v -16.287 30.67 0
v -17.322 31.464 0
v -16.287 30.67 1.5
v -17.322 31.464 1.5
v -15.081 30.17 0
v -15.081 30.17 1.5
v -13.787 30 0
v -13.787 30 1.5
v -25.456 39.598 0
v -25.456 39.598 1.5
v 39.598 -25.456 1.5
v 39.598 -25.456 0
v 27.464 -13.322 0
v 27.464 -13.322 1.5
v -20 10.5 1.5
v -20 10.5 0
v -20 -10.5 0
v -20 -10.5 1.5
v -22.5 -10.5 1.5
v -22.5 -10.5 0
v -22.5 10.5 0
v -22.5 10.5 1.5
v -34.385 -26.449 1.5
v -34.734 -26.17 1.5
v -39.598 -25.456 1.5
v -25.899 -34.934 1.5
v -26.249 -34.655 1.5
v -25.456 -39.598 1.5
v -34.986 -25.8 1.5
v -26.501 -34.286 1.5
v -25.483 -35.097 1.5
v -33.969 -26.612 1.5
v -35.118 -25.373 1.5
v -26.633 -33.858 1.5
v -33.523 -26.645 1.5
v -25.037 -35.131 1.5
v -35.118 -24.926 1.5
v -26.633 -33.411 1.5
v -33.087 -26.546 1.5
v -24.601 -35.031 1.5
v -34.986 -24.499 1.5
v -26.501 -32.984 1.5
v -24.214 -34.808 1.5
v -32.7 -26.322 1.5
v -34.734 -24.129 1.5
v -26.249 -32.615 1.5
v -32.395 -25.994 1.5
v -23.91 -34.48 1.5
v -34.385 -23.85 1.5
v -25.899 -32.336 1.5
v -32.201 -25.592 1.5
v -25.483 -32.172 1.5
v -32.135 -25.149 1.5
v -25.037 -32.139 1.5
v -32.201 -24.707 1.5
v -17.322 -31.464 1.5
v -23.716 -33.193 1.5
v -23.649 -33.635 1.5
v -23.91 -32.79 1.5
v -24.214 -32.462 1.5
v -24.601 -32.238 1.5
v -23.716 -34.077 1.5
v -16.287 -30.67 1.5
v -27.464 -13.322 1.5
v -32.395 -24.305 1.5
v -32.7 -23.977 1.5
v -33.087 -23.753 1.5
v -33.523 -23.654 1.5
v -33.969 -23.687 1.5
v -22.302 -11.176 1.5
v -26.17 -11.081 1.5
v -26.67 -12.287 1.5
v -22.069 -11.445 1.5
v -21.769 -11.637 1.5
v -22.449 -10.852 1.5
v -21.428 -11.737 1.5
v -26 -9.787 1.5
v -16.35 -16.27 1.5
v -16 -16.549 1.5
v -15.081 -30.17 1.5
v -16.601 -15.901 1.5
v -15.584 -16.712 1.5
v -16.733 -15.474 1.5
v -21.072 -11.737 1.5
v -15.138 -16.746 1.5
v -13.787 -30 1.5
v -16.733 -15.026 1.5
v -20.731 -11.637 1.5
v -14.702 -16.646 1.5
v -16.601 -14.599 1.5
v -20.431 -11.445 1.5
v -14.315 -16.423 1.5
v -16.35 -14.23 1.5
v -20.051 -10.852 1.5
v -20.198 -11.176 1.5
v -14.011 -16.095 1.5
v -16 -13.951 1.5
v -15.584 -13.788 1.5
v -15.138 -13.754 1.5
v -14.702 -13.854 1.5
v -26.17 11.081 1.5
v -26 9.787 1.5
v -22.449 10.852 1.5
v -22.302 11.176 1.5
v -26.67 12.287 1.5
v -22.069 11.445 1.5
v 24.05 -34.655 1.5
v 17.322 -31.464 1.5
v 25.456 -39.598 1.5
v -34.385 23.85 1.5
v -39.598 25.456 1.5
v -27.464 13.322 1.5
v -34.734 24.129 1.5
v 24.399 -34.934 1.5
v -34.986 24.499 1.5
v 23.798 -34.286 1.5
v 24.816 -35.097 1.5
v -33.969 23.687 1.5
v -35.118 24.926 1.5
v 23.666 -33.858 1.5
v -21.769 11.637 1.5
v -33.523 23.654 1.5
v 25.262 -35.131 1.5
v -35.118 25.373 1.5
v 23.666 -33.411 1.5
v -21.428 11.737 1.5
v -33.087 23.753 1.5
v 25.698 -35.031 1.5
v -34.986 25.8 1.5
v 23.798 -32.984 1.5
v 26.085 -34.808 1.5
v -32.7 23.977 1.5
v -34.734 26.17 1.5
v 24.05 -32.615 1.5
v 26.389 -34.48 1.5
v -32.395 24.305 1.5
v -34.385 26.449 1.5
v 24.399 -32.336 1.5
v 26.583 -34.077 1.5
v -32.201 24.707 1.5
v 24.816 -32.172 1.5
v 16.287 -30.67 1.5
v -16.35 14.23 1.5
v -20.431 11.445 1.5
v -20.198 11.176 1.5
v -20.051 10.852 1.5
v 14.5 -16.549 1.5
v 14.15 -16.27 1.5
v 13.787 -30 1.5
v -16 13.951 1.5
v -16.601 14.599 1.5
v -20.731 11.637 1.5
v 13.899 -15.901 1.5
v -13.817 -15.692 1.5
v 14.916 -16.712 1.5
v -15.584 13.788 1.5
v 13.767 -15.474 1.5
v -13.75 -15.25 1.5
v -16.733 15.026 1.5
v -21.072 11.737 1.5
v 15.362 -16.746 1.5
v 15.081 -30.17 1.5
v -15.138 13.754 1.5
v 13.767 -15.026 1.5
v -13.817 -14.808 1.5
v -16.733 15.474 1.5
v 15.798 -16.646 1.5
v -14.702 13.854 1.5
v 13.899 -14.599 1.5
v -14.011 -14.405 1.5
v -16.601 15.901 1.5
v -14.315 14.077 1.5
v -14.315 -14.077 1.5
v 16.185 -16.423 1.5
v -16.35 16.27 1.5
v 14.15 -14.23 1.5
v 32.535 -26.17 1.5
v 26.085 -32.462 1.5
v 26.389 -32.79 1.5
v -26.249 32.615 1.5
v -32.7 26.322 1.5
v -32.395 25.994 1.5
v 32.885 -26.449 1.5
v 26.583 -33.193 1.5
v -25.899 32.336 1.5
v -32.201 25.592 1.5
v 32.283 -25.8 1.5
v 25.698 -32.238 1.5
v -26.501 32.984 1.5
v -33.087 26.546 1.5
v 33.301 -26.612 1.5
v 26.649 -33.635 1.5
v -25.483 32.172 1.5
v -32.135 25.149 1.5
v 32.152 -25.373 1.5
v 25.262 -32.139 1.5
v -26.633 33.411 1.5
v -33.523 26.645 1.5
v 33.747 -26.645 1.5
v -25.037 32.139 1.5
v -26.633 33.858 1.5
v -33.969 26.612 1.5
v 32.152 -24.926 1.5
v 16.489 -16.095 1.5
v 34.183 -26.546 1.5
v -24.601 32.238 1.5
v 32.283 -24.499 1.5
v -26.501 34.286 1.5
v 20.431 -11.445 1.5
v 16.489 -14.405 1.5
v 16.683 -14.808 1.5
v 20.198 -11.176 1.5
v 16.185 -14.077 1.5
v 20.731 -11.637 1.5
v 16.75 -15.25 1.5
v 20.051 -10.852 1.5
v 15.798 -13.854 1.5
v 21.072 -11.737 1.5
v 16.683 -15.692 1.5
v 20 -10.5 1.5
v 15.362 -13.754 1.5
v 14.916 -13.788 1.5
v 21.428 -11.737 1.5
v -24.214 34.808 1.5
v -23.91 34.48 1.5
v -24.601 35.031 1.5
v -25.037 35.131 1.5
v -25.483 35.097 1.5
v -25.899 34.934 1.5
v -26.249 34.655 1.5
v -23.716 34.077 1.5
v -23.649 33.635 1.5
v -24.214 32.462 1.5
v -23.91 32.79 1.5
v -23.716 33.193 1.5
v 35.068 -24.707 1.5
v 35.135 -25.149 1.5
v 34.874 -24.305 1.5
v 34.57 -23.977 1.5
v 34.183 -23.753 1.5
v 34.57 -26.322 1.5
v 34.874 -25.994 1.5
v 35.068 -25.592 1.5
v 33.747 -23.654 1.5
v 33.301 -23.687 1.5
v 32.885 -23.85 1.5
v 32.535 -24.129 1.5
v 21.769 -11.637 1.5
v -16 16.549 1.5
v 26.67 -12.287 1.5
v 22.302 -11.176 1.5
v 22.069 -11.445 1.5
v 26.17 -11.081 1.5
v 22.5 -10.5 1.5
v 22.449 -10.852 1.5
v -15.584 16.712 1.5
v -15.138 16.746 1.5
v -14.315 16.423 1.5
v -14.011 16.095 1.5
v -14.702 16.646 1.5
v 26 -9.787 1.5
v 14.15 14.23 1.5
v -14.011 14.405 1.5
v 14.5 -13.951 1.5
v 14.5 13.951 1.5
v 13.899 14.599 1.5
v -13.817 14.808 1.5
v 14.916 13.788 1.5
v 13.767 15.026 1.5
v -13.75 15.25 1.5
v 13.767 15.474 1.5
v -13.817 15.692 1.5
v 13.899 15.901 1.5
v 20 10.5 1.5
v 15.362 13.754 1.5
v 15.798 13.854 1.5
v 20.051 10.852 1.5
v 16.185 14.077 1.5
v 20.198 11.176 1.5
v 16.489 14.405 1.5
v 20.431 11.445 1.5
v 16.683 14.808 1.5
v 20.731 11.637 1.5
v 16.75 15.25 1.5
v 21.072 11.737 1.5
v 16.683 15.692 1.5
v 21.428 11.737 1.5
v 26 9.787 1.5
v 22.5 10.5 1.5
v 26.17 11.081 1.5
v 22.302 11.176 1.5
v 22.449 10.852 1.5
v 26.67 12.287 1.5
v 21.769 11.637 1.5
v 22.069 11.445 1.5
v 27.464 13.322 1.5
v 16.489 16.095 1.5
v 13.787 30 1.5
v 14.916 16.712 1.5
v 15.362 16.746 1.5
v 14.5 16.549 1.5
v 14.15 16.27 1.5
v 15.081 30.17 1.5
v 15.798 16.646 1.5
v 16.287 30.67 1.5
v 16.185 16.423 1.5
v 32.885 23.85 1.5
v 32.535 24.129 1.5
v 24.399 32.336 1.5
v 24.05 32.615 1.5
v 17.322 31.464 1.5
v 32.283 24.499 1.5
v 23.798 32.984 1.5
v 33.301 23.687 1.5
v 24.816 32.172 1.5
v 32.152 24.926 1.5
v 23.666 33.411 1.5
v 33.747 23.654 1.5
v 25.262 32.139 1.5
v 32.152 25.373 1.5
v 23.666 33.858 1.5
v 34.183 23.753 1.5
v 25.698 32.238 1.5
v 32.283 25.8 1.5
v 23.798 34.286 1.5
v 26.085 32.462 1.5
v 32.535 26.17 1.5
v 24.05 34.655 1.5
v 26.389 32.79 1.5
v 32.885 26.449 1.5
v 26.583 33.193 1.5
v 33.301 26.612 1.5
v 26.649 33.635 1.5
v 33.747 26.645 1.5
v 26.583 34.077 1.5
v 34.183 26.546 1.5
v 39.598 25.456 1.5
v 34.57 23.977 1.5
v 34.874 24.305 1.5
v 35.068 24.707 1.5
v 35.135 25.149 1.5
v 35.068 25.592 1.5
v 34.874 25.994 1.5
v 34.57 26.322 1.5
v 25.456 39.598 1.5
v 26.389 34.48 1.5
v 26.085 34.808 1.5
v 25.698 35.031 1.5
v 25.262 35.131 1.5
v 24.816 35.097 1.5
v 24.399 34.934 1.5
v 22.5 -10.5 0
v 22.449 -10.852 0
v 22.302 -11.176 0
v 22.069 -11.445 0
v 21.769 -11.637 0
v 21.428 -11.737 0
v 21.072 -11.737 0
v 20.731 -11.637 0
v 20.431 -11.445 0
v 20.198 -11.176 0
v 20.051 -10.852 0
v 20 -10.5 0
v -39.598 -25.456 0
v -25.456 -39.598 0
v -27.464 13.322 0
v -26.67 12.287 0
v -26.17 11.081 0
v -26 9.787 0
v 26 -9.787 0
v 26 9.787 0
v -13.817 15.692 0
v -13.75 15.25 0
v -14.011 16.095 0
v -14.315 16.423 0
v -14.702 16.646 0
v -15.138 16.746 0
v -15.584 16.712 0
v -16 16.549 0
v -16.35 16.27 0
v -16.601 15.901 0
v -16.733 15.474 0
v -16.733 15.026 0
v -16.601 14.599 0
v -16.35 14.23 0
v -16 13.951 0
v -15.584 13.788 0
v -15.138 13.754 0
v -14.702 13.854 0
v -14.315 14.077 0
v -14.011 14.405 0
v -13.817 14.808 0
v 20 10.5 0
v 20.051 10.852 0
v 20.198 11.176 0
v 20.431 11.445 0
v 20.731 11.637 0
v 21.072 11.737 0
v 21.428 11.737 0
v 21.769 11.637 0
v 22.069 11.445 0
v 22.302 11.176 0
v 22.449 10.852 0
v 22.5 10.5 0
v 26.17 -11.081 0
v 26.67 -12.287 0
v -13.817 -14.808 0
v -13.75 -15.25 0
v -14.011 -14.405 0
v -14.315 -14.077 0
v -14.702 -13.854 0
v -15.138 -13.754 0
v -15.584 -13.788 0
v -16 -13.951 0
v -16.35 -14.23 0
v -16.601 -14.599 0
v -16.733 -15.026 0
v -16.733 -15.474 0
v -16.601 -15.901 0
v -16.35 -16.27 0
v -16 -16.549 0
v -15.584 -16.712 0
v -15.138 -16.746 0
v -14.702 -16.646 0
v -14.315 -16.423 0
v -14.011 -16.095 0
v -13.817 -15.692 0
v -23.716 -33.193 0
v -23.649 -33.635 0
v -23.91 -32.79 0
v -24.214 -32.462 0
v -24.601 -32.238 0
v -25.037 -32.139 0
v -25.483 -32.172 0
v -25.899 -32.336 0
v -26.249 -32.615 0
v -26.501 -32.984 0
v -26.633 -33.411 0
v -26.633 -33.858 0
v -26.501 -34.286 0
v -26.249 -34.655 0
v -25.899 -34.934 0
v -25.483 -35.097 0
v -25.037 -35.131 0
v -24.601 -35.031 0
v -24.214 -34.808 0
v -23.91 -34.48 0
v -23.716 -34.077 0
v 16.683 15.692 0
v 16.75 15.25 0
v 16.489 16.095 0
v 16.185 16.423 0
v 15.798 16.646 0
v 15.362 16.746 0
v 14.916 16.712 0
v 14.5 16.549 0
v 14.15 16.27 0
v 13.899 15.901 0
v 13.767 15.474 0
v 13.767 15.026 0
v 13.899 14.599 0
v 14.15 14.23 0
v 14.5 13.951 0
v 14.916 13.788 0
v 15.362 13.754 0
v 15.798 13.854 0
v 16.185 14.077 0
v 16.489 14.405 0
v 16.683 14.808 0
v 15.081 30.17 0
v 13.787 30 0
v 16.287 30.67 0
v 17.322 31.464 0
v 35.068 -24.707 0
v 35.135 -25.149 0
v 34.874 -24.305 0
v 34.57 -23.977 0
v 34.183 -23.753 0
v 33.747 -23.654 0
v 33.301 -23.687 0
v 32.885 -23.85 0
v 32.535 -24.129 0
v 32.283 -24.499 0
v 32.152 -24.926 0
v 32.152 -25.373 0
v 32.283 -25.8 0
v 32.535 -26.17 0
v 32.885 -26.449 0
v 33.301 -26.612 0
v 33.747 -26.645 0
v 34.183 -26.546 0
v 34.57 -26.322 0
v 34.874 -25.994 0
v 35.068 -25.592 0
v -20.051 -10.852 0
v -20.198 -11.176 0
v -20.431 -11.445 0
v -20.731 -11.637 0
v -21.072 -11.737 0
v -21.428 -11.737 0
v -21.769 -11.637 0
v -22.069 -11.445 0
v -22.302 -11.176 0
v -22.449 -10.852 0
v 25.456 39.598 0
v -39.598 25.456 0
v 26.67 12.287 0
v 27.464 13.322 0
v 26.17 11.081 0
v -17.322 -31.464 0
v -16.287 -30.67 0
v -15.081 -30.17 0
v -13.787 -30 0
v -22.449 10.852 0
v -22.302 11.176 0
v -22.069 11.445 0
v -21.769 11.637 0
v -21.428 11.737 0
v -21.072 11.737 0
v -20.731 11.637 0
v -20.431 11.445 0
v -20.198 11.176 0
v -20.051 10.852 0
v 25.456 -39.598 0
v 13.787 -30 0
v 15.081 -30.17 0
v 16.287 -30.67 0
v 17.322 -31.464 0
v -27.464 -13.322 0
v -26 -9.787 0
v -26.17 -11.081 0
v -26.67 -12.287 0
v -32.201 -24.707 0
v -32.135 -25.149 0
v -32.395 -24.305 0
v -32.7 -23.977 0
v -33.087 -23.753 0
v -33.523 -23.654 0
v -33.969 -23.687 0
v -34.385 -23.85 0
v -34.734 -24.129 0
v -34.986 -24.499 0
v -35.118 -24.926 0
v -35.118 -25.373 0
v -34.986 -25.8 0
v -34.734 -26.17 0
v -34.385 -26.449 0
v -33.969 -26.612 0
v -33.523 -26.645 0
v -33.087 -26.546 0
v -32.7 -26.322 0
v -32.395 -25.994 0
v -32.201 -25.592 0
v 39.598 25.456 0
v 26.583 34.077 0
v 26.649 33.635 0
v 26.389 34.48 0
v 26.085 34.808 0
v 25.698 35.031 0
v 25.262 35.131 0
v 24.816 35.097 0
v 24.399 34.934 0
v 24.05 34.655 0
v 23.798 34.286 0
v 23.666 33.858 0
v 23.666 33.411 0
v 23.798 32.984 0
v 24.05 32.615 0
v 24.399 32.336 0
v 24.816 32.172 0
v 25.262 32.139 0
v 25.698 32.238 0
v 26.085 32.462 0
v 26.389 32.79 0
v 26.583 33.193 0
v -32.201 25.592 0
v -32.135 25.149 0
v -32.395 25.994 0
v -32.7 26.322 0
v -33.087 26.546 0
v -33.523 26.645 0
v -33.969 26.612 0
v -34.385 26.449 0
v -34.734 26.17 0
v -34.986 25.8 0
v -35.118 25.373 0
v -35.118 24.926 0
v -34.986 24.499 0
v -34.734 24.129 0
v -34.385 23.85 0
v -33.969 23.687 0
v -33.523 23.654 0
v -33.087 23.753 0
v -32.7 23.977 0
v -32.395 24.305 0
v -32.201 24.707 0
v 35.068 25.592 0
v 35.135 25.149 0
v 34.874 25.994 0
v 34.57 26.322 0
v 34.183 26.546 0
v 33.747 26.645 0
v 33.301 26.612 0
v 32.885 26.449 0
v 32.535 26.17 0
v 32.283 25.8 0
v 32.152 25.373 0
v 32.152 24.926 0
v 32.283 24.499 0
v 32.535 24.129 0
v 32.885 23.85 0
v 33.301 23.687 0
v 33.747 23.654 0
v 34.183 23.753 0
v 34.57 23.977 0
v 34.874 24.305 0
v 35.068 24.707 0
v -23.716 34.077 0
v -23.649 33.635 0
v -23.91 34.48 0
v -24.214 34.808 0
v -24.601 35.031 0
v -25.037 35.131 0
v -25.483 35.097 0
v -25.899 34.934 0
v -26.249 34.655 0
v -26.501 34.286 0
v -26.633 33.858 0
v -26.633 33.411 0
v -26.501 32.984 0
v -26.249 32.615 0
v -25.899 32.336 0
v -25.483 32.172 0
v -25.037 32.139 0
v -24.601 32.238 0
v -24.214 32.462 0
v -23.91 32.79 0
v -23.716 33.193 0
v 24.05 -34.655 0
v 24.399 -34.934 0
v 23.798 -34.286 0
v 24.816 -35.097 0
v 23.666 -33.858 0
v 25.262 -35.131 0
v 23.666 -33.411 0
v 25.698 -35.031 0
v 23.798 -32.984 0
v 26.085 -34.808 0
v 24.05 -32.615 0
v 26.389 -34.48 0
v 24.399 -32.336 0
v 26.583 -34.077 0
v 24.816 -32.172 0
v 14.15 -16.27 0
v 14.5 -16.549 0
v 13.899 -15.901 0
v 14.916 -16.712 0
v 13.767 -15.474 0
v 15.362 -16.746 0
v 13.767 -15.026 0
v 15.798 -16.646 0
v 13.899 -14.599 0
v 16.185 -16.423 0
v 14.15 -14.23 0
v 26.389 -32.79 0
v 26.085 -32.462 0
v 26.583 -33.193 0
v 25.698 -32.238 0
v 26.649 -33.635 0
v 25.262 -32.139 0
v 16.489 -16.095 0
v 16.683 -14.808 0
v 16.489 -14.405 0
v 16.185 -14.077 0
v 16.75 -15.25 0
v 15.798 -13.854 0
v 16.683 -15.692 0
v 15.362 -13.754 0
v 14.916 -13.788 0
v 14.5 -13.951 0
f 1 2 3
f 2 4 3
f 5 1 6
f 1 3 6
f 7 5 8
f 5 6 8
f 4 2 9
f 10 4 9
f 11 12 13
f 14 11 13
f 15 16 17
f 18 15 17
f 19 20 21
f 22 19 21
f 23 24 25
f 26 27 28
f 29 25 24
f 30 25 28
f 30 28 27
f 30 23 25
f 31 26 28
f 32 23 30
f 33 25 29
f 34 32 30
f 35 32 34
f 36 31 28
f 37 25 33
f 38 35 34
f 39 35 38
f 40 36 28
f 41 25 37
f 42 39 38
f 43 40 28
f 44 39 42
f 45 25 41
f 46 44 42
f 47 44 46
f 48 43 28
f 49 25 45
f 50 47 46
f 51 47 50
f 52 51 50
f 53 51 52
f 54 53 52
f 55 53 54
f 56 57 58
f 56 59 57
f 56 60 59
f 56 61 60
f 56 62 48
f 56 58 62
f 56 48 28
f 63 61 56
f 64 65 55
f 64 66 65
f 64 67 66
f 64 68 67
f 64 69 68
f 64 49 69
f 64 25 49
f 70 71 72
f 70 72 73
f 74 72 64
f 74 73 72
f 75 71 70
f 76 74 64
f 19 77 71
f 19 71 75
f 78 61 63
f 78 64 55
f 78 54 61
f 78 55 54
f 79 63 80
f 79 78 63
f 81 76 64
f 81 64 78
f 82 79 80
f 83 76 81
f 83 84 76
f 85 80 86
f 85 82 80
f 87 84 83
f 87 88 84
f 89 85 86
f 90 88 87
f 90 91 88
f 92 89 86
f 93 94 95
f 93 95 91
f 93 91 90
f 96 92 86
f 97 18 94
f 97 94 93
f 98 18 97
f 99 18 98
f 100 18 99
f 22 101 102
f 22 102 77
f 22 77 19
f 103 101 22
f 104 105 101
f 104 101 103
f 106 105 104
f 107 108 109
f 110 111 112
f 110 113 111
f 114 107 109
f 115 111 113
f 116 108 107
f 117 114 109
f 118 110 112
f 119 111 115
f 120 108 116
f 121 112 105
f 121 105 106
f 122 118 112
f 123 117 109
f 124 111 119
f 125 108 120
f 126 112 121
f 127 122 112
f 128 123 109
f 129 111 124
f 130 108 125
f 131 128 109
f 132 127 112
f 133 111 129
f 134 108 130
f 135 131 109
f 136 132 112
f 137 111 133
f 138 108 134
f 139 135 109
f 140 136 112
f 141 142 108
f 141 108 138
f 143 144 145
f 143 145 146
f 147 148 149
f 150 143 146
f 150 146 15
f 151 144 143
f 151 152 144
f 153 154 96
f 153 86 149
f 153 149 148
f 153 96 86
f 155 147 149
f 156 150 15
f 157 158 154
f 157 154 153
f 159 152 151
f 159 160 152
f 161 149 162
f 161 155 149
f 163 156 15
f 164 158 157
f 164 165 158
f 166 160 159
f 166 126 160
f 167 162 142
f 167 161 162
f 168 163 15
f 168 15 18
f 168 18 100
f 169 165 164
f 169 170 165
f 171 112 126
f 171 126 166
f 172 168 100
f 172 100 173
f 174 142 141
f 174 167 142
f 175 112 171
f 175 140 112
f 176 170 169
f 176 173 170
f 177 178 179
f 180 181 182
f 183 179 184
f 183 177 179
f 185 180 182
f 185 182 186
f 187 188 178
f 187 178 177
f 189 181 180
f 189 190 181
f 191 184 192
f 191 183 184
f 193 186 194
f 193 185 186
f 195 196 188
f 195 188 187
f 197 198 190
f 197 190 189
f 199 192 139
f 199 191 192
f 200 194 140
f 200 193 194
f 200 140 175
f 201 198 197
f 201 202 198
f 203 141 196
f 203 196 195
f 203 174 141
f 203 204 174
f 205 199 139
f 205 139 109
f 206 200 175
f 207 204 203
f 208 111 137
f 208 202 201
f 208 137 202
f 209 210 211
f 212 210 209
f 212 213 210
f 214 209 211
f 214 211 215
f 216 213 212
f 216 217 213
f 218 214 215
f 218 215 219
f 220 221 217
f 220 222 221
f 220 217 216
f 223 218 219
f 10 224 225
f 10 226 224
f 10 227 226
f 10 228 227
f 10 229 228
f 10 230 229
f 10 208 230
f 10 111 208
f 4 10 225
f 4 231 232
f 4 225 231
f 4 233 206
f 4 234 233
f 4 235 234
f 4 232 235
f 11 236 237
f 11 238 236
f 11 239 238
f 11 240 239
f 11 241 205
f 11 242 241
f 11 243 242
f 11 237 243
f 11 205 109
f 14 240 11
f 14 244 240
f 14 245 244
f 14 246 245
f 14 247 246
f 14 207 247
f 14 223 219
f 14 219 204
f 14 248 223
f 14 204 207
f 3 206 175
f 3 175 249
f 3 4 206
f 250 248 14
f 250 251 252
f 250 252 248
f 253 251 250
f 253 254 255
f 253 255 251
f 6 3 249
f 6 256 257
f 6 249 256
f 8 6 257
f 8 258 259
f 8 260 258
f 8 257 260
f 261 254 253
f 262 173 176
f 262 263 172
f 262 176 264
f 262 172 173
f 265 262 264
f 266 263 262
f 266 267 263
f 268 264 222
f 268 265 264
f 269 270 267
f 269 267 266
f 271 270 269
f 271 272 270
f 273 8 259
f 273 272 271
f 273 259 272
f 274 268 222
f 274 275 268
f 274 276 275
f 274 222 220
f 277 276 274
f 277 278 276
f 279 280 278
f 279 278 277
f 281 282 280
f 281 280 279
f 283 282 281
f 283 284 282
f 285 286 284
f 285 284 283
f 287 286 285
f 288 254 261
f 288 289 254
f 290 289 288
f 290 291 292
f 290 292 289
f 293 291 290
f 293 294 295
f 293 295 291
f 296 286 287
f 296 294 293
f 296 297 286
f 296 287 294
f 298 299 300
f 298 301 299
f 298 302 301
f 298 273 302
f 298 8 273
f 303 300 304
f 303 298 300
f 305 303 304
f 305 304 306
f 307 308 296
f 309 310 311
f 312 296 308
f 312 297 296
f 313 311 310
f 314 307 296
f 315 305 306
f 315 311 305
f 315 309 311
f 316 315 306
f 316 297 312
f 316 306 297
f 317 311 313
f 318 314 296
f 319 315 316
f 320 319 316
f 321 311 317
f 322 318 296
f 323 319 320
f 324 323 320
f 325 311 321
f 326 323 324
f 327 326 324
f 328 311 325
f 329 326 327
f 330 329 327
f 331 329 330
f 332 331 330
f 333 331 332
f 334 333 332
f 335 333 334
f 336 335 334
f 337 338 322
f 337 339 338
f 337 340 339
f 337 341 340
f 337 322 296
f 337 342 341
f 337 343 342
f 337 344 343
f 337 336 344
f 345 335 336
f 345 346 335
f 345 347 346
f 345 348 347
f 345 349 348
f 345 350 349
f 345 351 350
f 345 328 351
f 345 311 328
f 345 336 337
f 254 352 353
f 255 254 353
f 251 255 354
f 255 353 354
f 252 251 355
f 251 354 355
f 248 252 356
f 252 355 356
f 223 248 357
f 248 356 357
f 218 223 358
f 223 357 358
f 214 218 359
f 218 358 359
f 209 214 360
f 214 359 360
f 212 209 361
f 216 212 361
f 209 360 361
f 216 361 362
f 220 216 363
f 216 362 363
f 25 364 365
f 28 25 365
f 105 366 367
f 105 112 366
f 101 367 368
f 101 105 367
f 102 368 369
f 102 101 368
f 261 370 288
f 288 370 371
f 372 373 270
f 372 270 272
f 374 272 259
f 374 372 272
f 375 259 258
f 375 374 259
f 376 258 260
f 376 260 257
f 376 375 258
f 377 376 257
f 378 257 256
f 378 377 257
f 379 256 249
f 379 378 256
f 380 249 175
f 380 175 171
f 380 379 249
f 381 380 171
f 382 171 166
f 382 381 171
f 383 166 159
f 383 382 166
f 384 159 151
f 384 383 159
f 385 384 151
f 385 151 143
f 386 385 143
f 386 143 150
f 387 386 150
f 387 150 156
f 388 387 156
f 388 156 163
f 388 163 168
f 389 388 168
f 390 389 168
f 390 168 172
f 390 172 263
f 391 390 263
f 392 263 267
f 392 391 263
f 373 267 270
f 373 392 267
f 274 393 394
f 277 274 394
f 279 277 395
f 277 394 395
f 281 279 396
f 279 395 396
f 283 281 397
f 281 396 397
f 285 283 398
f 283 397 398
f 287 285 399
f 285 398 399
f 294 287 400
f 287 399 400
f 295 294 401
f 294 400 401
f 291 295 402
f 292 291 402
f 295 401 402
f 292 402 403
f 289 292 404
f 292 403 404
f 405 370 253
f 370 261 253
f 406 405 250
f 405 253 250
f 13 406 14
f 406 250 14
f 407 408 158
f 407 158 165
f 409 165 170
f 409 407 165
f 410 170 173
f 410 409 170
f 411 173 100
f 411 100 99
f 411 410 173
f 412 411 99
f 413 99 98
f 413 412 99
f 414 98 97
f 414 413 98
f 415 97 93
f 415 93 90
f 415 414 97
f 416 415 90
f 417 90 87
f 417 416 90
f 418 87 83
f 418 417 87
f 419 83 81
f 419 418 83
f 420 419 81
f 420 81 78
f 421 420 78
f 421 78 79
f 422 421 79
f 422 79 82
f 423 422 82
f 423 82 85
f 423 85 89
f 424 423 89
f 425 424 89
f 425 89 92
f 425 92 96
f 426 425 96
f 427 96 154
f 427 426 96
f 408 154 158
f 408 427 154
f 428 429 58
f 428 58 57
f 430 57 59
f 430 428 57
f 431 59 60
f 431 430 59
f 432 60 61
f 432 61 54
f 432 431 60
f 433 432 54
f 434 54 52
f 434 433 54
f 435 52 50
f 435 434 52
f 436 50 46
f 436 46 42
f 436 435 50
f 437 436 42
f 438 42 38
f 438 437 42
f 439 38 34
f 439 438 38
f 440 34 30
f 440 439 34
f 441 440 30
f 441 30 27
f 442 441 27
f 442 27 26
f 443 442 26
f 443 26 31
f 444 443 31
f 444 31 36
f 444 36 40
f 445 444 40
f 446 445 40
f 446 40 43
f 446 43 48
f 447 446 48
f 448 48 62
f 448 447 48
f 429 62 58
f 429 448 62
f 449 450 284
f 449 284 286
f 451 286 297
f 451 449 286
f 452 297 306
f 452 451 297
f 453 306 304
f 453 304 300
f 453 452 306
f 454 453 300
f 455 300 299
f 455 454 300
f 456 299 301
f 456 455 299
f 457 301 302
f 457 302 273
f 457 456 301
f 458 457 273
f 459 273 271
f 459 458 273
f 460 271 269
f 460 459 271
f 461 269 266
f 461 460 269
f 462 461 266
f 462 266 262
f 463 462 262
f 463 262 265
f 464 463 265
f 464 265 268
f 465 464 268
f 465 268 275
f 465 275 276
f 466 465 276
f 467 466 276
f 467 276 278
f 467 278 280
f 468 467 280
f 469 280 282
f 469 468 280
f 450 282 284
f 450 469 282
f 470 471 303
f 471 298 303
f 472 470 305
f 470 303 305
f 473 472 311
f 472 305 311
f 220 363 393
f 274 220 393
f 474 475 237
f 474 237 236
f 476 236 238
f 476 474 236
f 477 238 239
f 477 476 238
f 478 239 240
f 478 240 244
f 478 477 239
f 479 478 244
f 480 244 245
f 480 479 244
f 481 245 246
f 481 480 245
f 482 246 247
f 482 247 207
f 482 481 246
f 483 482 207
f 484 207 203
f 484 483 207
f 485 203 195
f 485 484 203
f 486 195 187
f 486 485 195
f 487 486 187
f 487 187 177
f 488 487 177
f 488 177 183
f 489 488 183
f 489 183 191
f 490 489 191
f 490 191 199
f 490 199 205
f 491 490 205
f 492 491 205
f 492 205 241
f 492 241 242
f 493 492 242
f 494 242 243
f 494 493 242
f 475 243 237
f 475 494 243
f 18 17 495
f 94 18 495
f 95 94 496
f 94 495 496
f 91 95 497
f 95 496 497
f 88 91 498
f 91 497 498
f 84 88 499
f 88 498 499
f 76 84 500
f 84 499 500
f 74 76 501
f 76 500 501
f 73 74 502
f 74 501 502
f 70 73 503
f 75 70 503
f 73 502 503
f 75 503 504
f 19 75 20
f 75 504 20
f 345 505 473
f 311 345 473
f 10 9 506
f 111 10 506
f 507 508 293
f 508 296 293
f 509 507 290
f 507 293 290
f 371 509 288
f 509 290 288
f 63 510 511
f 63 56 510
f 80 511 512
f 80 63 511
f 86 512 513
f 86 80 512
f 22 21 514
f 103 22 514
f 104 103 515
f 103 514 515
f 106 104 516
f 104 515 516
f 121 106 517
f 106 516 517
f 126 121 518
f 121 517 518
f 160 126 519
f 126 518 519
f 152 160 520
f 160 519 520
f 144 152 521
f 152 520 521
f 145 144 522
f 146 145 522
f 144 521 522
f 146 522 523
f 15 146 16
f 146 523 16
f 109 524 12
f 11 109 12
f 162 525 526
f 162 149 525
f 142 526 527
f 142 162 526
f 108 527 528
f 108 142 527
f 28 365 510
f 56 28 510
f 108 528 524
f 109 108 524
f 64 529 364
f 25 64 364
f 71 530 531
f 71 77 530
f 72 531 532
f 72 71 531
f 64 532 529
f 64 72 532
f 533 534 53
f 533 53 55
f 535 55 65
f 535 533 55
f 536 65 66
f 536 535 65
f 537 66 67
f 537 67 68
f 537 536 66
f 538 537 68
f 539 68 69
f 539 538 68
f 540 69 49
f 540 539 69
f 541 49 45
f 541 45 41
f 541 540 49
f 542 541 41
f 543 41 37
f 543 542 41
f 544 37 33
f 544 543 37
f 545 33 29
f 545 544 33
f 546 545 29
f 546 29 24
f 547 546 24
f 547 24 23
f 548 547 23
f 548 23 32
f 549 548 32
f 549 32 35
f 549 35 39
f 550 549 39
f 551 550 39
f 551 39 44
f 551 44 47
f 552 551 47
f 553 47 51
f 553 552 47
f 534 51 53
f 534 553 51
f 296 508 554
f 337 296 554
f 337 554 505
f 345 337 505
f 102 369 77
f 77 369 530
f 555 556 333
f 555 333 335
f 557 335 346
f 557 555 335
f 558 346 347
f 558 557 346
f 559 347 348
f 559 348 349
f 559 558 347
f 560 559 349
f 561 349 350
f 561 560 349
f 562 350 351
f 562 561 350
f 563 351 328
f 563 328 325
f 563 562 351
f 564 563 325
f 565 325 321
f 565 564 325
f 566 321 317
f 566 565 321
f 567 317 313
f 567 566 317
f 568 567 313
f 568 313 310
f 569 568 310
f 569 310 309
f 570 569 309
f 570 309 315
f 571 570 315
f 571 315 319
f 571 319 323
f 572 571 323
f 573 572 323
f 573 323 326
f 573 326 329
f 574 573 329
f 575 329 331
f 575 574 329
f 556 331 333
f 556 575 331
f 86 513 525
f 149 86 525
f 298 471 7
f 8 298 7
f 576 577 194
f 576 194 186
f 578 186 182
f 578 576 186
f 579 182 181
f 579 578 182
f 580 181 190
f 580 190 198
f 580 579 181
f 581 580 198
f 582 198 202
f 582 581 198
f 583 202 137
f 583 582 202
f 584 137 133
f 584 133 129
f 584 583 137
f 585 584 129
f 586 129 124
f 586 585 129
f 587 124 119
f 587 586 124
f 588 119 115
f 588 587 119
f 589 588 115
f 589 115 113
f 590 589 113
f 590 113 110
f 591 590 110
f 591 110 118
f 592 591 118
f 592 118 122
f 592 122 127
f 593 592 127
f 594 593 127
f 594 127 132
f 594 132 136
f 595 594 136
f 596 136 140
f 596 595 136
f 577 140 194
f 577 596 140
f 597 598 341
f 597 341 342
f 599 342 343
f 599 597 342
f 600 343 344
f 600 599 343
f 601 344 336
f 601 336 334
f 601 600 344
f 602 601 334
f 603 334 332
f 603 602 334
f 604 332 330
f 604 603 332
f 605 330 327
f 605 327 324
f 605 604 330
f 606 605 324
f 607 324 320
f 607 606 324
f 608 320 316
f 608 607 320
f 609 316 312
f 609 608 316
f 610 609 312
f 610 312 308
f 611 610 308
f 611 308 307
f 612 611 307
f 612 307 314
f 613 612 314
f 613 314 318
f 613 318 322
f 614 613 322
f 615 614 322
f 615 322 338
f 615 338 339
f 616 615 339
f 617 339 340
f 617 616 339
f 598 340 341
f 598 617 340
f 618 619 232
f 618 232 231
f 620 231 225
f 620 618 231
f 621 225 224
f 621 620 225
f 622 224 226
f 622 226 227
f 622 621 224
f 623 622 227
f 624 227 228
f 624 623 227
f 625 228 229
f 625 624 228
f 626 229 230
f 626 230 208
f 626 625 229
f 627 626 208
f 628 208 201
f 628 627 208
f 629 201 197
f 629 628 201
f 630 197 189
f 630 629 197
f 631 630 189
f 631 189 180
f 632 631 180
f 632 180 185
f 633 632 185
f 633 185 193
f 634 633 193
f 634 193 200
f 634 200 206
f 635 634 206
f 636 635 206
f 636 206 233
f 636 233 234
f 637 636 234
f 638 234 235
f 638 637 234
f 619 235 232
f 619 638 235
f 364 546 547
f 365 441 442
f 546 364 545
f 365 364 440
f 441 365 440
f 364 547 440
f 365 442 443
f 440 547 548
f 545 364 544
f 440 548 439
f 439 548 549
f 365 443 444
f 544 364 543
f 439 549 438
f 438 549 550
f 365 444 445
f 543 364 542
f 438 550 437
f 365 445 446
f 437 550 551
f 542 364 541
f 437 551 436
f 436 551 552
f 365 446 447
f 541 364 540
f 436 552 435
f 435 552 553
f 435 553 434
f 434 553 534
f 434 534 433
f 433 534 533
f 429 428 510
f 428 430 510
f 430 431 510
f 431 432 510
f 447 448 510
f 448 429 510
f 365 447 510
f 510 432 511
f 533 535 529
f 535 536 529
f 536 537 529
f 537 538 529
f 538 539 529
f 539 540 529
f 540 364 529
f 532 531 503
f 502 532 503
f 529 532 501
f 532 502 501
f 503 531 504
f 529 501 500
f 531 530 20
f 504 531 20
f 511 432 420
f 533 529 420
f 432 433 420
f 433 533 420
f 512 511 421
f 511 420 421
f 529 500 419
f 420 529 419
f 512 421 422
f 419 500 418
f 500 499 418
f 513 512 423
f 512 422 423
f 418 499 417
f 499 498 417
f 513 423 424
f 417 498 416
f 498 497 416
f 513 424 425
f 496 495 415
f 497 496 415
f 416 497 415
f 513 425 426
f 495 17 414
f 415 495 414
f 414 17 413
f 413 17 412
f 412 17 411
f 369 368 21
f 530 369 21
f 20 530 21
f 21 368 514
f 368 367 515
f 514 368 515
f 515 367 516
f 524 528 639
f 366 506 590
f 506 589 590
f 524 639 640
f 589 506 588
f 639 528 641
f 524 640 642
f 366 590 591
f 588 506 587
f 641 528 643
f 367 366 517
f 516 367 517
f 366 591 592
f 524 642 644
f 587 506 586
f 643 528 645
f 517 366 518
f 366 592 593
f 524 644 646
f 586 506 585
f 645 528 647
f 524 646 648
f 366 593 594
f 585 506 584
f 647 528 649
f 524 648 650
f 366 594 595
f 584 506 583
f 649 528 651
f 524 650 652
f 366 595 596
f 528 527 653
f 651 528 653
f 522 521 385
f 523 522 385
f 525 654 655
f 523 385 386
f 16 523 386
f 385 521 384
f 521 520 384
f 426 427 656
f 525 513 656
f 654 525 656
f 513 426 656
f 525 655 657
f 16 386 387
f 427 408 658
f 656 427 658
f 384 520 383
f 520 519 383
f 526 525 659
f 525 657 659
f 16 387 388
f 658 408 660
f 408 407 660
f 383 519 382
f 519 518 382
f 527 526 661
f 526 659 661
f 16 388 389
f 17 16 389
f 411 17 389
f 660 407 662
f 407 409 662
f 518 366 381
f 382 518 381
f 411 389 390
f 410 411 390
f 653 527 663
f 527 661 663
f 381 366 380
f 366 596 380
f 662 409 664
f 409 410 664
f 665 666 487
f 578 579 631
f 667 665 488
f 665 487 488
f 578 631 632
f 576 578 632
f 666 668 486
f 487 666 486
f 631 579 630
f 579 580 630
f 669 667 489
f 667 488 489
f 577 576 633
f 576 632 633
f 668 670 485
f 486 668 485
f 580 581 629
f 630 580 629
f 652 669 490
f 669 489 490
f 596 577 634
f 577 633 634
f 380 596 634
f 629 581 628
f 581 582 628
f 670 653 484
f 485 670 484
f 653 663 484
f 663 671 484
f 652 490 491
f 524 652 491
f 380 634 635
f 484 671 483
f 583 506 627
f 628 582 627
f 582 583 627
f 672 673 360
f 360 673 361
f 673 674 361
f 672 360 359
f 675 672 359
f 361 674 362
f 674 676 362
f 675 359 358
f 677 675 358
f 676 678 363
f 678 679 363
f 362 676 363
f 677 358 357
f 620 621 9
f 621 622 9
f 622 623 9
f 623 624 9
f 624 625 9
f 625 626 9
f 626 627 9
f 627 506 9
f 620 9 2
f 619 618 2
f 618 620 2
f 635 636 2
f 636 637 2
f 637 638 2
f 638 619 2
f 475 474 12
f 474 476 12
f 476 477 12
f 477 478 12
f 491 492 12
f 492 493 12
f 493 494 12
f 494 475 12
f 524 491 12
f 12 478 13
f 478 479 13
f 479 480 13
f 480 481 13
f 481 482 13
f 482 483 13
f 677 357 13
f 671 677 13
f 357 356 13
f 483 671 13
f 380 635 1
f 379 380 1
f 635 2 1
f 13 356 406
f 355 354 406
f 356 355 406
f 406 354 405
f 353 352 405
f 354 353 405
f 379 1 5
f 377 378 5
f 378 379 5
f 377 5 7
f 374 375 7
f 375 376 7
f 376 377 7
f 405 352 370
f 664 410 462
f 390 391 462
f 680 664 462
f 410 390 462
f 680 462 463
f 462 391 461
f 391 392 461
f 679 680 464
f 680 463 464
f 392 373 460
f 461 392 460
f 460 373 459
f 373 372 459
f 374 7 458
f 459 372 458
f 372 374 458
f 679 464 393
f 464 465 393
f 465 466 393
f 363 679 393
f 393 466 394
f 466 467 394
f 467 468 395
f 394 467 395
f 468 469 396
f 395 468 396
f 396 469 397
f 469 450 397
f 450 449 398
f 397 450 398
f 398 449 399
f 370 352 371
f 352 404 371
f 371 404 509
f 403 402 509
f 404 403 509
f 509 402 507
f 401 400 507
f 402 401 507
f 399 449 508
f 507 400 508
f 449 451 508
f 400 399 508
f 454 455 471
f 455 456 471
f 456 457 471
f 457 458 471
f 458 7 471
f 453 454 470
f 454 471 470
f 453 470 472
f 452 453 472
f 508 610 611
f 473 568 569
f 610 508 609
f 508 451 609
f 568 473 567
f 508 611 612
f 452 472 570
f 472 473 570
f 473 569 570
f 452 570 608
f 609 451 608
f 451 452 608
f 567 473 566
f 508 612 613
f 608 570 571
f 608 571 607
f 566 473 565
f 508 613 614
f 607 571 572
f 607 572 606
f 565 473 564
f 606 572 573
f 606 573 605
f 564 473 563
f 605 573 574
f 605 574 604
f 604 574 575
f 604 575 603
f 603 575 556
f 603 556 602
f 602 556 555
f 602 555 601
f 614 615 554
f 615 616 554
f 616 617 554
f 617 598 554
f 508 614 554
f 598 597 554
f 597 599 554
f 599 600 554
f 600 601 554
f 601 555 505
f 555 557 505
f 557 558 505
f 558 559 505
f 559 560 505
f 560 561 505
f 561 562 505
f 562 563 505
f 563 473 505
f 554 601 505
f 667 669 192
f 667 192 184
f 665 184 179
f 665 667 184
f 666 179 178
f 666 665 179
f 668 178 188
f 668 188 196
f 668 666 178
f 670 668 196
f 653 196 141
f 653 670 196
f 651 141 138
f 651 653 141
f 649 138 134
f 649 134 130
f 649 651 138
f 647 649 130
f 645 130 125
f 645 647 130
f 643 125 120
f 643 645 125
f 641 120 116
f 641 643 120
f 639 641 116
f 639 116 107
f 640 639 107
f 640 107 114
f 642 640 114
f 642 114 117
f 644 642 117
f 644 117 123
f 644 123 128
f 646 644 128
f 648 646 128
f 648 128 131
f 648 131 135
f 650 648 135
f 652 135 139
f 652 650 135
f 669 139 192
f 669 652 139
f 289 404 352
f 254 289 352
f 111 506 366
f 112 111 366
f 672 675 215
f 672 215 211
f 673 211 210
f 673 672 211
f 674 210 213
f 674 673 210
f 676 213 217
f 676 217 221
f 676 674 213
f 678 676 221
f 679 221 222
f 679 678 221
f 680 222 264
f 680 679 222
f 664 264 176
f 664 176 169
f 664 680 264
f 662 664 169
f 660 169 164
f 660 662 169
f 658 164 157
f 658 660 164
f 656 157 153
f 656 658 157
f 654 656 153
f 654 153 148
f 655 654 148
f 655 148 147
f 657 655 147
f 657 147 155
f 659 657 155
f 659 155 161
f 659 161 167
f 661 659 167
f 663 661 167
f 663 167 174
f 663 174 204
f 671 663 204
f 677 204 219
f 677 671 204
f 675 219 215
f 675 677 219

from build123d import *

# Parameters (mm, degrees)
F0_R     = 1.5
F1_DEPTH = 1.5
F2_R     = 5


with BuildPart() as f1:
    # F0 (on Top) → F1 (new body)
    with BuildSketch(Plane.XY):
        Polygon((-25.455844, 39.59798), (-39.59798, 25.455844), (-26, 11.857864), (-26, -11.857864), (-39.59798, -25.455844), (-25.455844, -39.59798), (-15.857864, -30), (15.857864, -30), (25.455844, -39.59798), (39.59798, -25.455844), (26, -11.857864), (26, 11.857864), (39.59798, 25.455844), (25.455844, 39.59798), (15.857864, 30), (-15.857864, 30), align=None)
        with Locations((-25.149495, -33.634776)):
            Circle(F0_R, mode=Mode.SUBTRACT)
        with Locations((-33.634776, -25.149495)):
            Circle(F0_R, mode=Mode.SUBTRACT)
        with Locations((-15.25, -15.25)):
            Circle(F0_R, mode=Mode.SUBTRACT)
        with Locations((25.149495, -33.634776)):
            Circle(F0_R, mode=Mode.SUBTRACT)
        with Locations((33.634776, -25.149495)):
            Circle(F0_R, mode=Mode.SUBTRACT)
        with Locations((15.25, -15.25)):
            Circle(F0_R, mode=Mode.SUBTRACT)
        with BuildLine():
            ThreePointArc((-22.5, 10.5), (-21.25, 11.75), (-20, 10.5))
            Line((-20, 10.5), (-20, -10.5))
            ThreePointArc((-20, -10.5), (-21.25, -11.75), (-22.5, -10.5))
            Line((-22.5, -10.5), (-22.5, 10.5))
        make_face(mode=Mode.SUBTRACT)
        with Locations((-15.25, 15.25)):
            Circle(F0_R, mode=Mode.SUBTRACT)
        with Locations((-33.634776, 25.149495)):
            Circle(F0_R, mode=Mode.SUBTRACT)
        with Locations((-25.149495, 33.634776)):
            Circle(F0_R, mode=Mode.SUBTRACT)
        with Locations((15.25, 15.25)):
            Circle(F0_R, mode=Mode.SUBTRACT)
        with BuildLine():
            Line((20, -10.5), (20, 10.5))
            ThreePointArc((20, 10.5), (21.25, 11.75), (22.5, 10.5))
            Line((22.5, 10.5), (22.5, -10.5))
            ThreePointArc((22.5, -10.5), (21.25, -11.75), (20, -10.5))
        make_face(mode=Mode.SUBTRACT)
        with Locations((33.634776, 25.149495)):
            Circle(F0_R, mode=Mode.SUBTRACT)
        with Locations((25.149495, 33.634776)):
            Circle(F0_R, mode=Mode.SUBTRACT)
    extrude(amount=F1_DEPTH)

    # F2
    f2_edges = [f1.edges().sort_by_distance(p)[0] for p in [
        (-15.857864, 30, 0.75),
        (15.857864, 30, 0.75),
        (26, 11.857864, 0.75),
        (26, -11.857864, 0.75),
        (-26, -11.857864, 0.75),
        (-26, 11.857864, 0.75),
        (-15.857864, -30, 0.75),
        (15.857864, -30, 0.75),
    ]]
    fillet(f2_edges, radius=F2_R)


solid = f1.part
